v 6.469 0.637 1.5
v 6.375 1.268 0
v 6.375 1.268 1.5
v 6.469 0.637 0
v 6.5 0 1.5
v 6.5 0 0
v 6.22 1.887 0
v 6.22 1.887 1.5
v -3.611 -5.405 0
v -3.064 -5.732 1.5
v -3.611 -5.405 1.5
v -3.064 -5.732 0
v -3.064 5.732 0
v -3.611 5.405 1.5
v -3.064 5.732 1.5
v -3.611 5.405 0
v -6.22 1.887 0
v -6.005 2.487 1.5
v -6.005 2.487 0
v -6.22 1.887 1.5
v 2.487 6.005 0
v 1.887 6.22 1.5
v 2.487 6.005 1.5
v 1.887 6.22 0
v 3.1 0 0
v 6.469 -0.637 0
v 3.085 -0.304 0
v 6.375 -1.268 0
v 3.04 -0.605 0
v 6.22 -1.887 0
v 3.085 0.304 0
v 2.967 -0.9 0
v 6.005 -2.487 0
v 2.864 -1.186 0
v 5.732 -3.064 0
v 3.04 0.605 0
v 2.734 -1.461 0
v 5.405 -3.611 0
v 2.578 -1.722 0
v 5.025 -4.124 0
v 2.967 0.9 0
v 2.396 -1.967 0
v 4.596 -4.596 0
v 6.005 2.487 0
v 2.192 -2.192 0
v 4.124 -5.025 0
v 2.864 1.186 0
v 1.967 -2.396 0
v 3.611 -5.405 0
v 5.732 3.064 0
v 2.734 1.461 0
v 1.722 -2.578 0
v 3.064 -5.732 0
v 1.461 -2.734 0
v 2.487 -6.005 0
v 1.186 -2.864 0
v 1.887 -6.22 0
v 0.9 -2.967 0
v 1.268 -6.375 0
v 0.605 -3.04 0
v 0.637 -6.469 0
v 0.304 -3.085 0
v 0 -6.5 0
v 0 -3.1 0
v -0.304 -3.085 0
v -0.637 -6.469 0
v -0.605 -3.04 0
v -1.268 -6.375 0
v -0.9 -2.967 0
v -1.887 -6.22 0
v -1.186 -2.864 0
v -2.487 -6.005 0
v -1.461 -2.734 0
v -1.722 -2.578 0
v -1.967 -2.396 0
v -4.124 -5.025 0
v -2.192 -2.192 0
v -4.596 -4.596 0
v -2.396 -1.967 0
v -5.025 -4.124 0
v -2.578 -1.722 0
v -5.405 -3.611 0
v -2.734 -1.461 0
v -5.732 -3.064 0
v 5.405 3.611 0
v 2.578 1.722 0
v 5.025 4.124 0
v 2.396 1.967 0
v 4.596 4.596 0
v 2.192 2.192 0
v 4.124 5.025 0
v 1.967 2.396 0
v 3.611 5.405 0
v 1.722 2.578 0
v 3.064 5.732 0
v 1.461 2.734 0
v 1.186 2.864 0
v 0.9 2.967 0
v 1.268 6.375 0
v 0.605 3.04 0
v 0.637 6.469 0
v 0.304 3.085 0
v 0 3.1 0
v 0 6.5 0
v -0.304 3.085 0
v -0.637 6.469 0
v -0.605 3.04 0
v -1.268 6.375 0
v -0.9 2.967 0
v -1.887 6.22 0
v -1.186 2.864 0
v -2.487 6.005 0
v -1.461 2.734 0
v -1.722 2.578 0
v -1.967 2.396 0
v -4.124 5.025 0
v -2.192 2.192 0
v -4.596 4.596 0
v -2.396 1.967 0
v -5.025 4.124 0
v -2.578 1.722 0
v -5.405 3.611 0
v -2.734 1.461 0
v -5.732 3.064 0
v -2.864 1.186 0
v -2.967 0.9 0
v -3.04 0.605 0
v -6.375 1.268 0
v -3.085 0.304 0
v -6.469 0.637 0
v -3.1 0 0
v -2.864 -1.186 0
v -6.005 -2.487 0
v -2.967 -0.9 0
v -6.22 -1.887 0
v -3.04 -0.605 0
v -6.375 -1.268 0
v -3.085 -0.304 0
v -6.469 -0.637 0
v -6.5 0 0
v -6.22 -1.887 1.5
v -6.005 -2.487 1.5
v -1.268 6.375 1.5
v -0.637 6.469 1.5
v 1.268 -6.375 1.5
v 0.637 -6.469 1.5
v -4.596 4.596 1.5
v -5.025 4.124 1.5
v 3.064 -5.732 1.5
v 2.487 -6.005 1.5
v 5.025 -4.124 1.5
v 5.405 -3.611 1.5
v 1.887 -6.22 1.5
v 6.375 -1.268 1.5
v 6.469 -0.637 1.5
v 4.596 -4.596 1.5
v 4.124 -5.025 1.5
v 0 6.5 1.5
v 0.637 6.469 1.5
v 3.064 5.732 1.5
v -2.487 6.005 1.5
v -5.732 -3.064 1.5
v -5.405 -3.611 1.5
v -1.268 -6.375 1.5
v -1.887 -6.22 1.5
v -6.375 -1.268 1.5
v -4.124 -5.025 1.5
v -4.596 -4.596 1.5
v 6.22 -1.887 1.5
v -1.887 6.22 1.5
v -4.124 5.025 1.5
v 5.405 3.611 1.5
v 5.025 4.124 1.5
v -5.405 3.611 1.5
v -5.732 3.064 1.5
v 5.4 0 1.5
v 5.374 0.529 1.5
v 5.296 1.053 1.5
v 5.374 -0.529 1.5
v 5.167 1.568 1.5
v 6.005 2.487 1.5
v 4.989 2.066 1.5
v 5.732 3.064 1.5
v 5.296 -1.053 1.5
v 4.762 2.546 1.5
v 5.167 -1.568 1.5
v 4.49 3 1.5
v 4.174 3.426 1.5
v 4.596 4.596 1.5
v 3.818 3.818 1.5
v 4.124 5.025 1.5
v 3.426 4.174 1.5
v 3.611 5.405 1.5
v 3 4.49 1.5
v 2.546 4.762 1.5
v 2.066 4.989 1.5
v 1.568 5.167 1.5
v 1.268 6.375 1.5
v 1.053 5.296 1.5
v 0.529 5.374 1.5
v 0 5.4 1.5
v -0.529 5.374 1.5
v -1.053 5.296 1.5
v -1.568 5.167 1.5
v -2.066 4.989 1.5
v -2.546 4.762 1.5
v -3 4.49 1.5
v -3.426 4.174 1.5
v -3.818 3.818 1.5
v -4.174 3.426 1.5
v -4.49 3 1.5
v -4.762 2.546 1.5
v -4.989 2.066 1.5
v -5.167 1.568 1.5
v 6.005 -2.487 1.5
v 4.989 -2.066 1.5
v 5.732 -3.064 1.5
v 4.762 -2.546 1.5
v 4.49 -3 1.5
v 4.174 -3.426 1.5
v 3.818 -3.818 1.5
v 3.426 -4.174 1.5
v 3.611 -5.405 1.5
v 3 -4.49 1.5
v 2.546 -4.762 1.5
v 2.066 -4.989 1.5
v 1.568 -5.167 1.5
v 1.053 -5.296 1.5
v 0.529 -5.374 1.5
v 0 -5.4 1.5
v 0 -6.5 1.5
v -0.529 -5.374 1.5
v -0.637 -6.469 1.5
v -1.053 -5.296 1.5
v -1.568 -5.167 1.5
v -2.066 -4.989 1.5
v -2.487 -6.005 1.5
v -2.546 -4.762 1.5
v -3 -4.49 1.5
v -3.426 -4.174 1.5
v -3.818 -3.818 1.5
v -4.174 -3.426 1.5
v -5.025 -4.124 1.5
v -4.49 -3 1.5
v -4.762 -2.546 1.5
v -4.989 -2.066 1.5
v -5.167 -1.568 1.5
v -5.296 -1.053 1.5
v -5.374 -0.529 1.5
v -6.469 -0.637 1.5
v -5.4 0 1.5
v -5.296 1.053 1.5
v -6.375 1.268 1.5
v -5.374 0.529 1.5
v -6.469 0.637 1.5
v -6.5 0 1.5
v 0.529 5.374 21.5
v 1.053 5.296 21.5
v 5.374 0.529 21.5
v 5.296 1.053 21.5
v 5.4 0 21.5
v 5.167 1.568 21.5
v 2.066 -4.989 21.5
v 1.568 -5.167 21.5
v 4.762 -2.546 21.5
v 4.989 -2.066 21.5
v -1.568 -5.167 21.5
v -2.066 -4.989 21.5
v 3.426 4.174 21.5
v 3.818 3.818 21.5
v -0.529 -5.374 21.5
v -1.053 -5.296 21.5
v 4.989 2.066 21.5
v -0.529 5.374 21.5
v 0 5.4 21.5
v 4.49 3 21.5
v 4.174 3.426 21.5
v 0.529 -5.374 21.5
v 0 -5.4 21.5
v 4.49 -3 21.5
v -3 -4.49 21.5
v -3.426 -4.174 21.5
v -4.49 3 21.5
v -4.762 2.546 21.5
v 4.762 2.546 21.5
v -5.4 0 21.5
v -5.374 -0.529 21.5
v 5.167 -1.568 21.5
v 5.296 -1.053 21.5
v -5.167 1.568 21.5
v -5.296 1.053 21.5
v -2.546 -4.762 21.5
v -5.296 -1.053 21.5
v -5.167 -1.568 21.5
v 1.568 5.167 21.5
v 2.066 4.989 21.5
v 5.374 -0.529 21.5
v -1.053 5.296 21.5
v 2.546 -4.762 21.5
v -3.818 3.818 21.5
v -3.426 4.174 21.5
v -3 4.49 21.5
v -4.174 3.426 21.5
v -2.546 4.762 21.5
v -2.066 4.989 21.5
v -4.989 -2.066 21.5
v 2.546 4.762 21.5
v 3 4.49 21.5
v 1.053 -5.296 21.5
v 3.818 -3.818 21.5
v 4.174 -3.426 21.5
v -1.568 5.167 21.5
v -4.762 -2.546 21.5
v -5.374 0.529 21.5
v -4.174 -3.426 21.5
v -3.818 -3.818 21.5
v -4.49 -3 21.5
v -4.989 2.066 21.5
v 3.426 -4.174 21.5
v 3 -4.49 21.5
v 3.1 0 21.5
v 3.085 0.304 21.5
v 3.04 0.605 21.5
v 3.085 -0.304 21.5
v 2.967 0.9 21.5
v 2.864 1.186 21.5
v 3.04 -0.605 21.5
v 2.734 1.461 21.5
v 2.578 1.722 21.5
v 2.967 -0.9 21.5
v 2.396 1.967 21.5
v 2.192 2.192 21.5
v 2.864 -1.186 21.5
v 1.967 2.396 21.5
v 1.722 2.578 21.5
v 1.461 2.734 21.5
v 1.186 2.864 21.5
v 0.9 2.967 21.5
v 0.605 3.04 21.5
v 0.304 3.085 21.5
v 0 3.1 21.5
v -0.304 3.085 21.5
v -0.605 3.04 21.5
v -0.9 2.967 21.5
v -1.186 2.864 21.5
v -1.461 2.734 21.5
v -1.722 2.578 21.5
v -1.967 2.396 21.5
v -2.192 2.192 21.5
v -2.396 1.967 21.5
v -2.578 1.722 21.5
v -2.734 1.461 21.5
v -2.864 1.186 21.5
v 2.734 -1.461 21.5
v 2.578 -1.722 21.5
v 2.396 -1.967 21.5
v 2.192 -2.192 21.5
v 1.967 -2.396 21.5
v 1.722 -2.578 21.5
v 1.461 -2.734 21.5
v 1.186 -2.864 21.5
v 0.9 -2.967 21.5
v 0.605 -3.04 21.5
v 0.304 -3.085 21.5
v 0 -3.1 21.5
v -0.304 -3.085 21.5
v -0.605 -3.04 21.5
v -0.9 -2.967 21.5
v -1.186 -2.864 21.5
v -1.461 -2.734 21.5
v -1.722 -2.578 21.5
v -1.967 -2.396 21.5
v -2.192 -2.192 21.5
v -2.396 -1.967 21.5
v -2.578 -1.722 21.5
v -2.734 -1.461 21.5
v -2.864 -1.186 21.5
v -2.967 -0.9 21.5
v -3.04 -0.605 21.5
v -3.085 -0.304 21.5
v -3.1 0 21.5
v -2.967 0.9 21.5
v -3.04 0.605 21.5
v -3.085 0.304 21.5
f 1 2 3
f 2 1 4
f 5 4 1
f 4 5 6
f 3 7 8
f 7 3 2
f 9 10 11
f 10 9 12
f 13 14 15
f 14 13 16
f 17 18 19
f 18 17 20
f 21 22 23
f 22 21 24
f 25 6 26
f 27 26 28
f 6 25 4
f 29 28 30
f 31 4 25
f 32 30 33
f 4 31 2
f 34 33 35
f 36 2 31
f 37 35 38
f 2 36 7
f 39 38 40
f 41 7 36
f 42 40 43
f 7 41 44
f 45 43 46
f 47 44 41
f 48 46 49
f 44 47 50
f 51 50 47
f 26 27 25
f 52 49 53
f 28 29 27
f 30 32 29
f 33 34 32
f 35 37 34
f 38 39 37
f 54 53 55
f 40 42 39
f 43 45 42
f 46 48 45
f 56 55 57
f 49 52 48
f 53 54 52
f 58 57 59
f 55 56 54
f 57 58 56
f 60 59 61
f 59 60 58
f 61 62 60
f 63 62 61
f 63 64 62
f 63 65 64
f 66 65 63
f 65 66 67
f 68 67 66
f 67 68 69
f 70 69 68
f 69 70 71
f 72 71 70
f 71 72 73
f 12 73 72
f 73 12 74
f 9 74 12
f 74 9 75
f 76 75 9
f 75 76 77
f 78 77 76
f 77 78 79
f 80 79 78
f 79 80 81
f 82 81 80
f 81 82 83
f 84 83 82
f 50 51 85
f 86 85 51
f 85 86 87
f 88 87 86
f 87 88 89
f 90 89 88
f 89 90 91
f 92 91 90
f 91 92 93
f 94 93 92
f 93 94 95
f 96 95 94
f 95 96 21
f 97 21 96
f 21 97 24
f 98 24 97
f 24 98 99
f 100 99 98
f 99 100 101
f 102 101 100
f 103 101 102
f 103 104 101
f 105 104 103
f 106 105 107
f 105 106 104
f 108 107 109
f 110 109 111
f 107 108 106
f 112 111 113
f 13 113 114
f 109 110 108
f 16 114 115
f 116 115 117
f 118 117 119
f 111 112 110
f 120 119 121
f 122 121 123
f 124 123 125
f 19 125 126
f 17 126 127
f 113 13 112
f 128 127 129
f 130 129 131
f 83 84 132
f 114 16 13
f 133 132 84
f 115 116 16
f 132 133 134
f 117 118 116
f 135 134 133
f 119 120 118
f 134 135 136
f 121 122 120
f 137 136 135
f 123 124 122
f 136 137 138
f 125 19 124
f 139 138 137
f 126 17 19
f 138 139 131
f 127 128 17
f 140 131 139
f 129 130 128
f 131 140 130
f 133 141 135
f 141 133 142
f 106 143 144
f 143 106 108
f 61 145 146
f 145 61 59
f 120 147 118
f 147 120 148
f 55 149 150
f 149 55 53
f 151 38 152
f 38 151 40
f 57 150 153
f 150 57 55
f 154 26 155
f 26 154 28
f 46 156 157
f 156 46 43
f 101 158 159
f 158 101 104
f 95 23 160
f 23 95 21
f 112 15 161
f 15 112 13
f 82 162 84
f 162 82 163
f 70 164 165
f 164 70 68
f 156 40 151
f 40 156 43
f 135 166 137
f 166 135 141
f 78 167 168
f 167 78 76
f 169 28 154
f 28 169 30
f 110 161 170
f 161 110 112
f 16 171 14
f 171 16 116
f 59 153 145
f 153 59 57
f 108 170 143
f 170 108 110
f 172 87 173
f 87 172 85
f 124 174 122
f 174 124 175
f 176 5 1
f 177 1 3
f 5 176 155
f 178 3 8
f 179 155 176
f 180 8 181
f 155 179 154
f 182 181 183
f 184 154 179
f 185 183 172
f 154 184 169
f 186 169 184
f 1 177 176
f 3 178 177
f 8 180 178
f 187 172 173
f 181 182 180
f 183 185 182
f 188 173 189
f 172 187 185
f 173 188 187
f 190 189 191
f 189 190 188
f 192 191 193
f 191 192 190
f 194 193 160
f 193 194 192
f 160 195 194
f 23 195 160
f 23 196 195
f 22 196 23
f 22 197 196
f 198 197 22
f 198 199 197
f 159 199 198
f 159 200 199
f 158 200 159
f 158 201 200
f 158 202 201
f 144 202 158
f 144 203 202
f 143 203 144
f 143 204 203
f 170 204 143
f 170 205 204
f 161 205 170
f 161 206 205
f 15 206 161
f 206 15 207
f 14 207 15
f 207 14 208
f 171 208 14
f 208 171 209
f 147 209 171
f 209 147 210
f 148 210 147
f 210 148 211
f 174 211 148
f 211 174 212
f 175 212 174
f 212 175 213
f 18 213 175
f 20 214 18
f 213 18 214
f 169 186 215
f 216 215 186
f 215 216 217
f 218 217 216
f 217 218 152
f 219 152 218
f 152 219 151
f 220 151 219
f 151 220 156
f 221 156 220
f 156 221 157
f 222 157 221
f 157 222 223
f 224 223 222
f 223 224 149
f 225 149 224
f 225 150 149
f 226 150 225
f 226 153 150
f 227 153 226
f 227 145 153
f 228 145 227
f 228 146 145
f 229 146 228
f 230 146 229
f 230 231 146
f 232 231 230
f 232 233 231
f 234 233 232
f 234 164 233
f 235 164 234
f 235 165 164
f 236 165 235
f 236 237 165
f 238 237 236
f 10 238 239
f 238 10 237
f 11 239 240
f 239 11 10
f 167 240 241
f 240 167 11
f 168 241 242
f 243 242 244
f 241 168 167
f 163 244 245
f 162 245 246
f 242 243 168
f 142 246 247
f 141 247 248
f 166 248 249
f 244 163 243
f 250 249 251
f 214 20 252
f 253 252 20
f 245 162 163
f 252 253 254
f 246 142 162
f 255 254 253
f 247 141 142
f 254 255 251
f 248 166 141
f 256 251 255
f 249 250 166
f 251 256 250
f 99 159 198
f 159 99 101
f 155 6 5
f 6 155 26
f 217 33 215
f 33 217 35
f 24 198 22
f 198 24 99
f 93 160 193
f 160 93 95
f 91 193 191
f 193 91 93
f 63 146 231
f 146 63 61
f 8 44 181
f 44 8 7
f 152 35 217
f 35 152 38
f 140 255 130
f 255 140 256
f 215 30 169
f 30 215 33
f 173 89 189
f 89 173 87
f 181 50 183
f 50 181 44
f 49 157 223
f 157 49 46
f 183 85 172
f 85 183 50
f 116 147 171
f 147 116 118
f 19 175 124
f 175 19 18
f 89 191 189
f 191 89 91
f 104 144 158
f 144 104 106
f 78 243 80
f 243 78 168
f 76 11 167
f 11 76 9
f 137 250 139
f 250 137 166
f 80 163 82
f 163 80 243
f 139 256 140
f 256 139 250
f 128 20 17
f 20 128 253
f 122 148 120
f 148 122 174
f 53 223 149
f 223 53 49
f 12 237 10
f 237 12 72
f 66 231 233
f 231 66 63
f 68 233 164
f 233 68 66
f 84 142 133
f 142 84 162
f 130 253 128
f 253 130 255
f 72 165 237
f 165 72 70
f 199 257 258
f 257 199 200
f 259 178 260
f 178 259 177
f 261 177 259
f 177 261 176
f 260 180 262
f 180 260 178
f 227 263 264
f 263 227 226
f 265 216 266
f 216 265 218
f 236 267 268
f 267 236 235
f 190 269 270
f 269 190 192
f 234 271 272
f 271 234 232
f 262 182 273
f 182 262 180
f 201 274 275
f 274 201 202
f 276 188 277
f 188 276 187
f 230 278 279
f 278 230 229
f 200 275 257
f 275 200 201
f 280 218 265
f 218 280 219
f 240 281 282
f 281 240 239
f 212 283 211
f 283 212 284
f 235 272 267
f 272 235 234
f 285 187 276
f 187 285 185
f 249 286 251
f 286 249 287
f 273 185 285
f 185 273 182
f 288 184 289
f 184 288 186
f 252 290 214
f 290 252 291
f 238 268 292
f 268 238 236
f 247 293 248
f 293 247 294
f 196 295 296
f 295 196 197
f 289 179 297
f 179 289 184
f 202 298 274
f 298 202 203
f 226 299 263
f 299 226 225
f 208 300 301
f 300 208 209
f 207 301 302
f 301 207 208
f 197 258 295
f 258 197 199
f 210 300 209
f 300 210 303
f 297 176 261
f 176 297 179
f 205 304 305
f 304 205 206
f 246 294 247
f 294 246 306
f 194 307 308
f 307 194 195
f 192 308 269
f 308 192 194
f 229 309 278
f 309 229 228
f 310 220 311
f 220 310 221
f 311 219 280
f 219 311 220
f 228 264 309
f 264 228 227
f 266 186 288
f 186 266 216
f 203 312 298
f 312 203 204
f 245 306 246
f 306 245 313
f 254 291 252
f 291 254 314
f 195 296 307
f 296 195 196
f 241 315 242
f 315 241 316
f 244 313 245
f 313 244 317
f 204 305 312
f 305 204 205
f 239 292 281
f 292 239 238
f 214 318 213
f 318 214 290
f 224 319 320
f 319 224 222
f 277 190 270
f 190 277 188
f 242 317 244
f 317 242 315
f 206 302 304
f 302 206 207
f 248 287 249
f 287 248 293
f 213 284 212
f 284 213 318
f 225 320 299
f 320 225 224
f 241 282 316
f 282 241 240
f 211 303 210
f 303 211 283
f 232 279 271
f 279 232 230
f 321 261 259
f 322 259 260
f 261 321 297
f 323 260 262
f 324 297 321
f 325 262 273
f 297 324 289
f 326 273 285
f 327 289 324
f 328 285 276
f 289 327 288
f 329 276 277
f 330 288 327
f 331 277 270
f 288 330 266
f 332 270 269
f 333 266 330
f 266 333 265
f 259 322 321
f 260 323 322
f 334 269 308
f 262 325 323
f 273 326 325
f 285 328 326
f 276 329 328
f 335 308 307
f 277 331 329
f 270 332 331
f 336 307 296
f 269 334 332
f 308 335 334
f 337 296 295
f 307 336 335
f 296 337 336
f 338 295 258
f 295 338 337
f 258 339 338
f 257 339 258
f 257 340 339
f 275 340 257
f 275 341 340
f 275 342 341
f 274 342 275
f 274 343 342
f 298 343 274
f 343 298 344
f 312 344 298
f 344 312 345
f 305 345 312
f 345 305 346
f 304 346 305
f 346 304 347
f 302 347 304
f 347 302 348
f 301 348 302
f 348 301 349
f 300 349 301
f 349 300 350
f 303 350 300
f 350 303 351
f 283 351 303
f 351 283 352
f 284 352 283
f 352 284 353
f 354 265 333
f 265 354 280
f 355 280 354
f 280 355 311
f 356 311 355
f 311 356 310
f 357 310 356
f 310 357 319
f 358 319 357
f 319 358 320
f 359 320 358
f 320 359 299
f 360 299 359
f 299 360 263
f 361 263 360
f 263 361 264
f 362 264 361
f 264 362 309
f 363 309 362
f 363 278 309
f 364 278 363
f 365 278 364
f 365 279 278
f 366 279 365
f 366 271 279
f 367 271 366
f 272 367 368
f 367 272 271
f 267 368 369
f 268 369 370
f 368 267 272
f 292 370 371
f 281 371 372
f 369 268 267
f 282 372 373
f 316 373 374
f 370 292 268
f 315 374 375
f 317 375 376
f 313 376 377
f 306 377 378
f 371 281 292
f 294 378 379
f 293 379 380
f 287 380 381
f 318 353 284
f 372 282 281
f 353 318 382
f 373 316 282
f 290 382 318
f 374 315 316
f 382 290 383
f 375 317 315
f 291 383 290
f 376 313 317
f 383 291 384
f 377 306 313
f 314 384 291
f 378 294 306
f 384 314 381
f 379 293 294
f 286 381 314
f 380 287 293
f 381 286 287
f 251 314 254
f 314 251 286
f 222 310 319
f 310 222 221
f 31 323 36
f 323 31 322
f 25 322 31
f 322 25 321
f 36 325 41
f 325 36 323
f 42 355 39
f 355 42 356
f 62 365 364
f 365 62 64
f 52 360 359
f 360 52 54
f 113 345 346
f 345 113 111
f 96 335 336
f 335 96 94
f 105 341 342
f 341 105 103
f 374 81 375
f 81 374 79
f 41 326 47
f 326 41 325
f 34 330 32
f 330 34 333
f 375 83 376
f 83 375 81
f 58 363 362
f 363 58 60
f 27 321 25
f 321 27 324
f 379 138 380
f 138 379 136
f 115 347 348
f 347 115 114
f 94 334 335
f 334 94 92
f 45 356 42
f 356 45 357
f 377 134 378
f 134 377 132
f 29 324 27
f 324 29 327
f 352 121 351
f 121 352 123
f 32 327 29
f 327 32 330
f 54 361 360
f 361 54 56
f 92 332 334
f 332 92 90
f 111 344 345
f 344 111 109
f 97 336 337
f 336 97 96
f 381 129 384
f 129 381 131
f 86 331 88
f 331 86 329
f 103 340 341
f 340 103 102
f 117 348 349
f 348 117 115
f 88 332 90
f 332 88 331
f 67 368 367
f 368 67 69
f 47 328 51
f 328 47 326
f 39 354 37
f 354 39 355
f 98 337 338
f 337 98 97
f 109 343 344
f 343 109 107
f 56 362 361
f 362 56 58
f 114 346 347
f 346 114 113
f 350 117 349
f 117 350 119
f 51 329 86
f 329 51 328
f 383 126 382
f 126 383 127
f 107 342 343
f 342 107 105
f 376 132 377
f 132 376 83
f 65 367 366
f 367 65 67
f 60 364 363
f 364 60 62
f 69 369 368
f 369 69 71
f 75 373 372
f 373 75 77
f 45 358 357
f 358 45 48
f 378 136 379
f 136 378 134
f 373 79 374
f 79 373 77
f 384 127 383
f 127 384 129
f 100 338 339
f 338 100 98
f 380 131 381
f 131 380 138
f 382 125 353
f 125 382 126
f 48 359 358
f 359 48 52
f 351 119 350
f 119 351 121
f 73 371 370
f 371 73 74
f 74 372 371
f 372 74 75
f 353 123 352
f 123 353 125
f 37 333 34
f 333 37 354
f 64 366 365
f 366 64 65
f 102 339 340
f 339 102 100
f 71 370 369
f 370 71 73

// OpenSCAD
// Adapter sleeve: 0.2 mL PCR tube for a 1.5 mL tube rack hole
// Print orientation: collar down on the bed (z = 0), sleeve up (+Z)

$fn = 64;

// ---- Dimensions (mm) ----
collar_d      = 13;    // collar outer diameter
collar_h      = 1.5;   // collar thickness (z = 0 to 1.5)
sleeve_od     = 10.8;  // sleeve body outer diameter
sleeve_top_z  = 21.5;  // top of sleeve body
bore_d        = 6.2;   // through-bore diameter
eps           = 0.5;   // cutter overshoot past faces

// ---- Model ----
difference() {
    union() {
        // Collar
        cylinder(d = collar_d, h = collar_h);
        // Sleeve body (overlaps slightly into collar for a clean union)
        translate([0, 0, collar_h - 0.01])
            cylinder(d = sleeve_od, h = sleeve_top_z - collar_h + 0.01);
    }
    // Straight through-bore
    translate([0, 0, -eps])
        cylinder(d = bore_d, h = sleeve_top_z + 2 * eps);
}
